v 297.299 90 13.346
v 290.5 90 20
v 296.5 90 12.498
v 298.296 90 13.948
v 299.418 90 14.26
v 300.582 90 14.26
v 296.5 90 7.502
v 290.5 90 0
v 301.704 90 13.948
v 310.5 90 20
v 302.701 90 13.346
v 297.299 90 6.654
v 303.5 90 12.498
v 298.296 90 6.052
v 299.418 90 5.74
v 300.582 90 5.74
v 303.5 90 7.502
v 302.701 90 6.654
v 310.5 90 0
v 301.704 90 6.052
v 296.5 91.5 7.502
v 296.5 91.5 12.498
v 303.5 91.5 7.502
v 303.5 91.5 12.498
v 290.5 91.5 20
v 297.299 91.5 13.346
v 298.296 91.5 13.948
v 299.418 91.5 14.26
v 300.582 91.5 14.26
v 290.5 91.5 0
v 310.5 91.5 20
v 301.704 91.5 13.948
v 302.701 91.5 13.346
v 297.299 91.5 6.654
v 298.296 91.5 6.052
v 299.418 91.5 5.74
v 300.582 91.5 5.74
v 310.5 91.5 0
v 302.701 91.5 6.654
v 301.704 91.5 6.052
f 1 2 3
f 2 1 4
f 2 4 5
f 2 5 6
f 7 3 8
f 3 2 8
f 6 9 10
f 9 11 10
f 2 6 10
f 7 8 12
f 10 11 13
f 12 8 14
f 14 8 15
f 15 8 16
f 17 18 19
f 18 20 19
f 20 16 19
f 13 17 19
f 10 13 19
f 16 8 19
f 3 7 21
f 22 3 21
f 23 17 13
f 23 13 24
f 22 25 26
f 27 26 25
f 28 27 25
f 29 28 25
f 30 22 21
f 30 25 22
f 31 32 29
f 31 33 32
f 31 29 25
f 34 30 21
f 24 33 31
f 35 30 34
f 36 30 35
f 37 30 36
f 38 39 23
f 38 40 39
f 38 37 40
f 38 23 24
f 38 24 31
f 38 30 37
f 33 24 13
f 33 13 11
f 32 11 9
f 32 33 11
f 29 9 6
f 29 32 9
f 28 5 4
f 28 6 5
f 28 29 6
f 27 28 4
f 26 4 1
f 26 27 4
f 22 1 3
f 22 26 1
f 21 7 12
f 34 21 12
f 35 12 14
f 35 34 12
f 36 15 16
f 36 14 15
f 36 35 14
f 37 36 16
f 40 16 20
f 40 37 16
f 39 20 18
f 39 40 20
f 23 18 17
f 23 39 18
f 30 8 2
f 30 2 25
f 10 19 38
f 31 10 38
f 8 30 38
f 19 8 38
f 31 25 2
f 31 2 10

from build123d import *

# Parameters (mm, degrees)
BOX039_W          = 10
BOX039_H          = 10
BOX039_DEPTH      = 10
BOX040_W          = 10
BOX040_H          = 10
BOX040_DEPTH      = 10
CYLINDER030_R     = 4.3
CYLINDER030_DEPTH = 5
BOX041_W          = 20
BOX041_H          = 1.5
BOX041_DEPTH      = 20


with BuildPart() as cube039:
    # Box039 → Box039 (new body)
    with BuildSketch(Plane(origin=(53.5, -105, 4), x_dir=(1, 0, 0), z_dir=(0, 0, 1))):
        with Locations((5, 5)):
            Rectangle(BOX039_W, BOX039_H)
    extrude(amount=BOX039_DEPTH)


with BuildPart() as cube040:
    # Box040 → Box040 (new body)
    with BuildSketch(Plane(origin=(36.5, -105, 4), x_dir=(1, 0, 0), z_dir=(0, 0, 1))):
        with Locations((5, 5)):
            Rectangle(BOX040_W, BOX040_H)
    extrude(amount=BOX040_DEPTH)


with BuildPart() as cut047:
    # Cylinder030 → Cylinder030 (new body)
    with BuildSketch(Plane(origin=(50, -100, 9), x_dir=(1, 0, 0), z_dir=(0, -1, 0))):
        Circle(CYLINDER030_R)
    extrude(amount=CYLINDER030_DEPTH)

    # Cut046: cut Cube040
    add(cube040.part, mode=Mode.SUBTRACT)

    # Cut047: cut Cube039
    add(cube039.part, mode=Mode.SUBTRACT)


with BuildPart() as cut047_1:
    # Cut047 placement: moved
    add(cut047.part.moved(Location((250, 193, 1))))


with BuildPart() as powerconnectertest:
    # Box041 → Box041 (new body)
    with BuildSketch(Plane(origin=(290.5, 90, 0), x_dir=(1, 0, 0), z_dir=(0, 0, 1))):
        with Locations((10, 0.75)):
            Rectangle(BOX041_W, BOX041_H)
    extrude(amount=BOX041_DEPTH)

    # Cut048: cut Cut047
    add(cut047_1.part, mode=Mode.SUBTRACT)


solid = powerconnectertest.part
